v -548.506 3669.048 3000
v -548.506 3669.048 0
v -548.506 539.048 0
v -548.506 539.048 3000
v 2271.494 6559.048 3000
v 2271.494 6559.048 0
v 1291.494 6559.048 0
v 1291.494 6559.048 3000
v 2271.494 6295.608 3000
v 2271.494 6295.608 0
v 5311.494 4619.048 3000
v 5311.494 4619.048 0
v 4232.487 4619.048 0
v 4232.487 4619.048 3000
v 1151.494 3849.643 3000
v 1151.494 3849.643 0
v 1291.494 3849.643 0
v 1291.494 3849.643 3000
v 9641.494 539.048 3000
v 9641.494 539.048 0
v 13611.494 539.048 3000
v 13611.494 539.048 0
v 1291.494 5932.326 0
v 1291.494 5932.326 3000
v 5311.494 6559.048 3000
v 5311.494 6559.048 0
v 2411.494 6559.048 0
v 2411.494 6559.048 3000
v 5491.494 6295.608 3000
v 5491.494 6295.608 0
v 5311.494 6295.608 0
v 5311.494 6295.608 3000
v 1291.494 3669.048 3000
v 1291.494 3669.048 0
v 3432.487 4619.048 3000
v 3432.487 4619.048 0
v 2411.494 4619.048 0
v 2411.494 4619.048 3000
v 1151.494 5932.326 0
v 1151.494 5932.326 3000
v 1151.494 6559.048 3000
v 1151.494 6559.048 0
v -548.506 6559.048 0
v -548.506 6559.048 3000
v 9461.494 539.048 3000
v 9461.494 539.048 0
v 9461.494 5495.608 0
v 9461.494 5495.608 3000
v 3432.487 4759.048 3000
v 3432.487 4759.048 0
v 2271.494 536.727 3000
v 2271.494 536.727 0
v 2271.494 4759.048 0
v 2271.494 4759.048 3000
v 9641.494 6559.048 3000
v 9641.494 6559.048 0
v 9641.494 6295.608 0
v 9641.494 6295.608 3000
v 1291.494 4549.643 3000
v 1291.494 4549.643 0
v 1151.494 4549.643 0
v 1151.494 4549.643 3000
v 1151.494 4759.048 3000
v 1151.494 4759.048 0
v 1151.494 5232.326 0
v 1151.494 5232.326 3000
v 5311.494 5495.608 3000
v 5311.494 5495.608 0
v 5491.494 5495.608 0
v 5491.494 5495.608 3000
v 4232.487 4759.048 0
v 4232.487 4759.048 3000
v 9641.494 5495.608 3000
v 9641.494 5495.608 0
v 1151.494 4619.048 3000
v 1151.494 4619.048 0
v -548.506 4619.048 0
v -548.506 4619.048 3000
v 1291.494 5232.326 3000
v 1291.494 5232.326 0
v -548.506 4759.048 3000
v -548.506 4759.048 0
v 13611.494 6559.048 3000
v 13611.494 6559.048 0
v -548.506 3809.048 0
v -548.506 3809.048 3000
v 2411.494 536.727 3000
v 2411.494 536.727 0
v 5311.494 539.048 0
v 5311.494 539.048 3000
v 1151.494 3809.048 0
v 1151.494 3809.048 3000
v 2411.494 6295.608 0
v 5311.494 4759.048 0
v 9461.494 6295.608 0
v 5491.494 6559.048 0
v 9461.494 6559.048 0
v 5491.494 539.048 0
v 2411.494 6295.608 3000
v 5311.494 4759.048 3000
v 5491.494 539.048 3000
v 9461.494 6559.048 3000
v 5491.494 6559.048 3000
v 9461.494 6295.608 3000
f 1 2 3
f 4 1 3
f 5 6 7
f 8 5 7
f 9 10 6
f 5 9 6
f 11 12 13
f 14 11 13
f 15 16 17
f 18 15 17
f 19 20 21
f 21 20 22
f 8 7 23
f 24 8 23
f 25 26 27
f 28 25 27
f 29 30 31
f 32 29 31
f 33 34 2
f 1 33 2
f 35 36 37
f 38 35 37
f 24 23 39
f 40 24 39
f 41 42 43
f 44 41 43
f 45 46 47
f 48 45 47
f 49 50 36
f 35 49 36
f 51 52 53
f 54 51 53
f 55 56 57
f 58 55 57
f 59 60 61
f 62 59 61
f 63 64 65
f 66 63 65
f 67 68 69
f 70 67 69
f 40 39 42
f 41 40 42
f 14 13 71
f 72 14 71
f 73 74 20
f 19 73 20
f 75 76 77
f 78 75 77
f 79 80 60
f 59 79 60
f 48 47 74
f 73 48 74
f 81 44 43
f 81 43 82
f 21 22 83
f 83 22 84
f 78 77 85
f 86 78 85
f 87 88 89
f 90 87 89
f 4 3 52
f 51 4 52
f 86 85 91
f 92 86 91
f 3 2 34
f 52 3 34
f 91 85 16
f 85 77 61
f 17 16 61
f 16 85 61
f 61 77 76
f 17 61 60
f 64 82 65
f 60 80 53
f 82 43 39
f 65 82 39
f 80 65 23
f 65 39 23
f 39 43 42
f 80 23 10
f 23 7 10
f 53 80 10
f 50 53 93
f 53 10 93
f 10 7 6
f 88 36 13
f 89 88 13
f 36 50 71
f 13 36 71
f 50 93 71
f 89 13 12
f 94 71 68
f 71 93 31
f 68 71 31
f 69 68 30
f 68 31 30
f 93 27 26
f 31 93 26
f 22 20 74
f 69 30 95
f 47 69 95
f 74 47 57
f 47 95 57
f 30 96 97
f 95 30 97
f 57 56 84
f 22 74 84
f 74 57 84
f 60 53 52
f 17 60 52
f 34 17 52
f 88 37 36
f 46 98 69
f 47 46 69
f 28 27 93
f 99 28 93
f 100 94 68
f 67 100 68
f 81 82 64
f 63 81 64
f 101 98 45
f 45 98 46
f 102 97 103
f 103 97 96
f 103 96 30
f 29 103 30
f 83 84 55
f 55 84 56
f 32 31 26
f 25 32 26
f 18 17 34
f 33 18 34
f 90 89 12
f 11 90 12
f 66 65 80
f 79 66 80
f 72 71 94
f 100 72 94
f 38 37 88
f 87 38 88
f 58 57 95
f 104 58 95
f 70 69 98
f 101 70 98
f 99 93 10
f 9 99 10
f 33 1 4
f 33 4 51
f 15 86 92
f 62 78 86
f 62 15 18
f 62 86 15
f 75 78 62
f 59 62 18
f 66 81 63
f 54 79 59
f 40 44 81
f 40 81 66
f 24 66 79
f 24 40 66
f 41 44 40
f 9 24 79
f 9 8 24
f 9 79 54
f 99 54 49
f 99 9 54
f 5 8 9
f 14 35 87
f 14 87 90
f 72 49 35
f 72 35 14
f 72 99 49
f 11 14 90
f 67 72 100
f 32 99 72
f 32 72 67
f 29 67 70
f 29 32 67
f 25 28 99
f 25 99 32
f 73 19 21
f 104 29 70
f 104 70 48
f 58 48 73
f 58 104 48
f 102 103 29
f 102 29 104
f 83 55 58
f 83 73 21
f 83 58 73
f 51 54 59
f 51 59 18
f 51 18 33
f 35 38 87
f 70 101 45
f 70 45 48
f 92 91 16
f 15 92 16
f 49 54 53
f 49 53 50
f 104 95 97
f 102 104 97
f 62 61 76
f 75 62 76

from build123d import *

# Parameters (mm, degrees)
F1_DEPTH = 3000


with BuildPart() as f1:
    # F0 (on Top) → F1 (new body)
    with BuildSketch(Plane.XY):
        Polygon((-548.506346, 3669.047837), (-548.506346, 539.047837), (2271.493654, 536.726892), (2271.493654, 4759.047837), (3432.486654, 4759.047837), (3432.486654, 4619.047837), (2411.493654, 4619.047837), (2411.493654, 536.726892), (5311.493654, 539.047837), (5311.493654, 4619.047837), (4232.486654, 4619.047837), (4232.486654, 4759.047837), (5311.493654, 4759.047837), (5311.493654, 5495.607567), (5491.493654, 5495.607567), (5491.493654, 539.047837), (9461.493654, 539.047837), (9461.493654, 5495.607567), (9641.493654, 5495.607567), (9641.493654, 539.047837), (13611.493654, 539.047837), (13611.493654, 6559.047837), (9641.493654, 6559.047837), (9641.493654, 6295.607567), (9461.493654, 6295.607567), (9461.493654, 6559.047837), (5491.493654, 6559.047837), (5491.493654, 6295.607567), (5311.493654, 6295.607567), (5311.493654, 6559.047837), (2411.493654, 6559.047837), (2411.493654, 6295.607567), (2271.493654, 6295.607567), (2271.493654, 6559.047837), (1291.493654, 6559.047837), (1291.493654, 5932.326435), (1151.493654, 5932.326435), (1151.493654, 6559.047837), (-548.506346, 6559.047837), (-548.506346, 4759.047837), (1151.493654, 4759.047837), (1151.493654, 5232.326435), (1291.493654, 5232.326435), (1291.493654, 4619.047837), (1291.493654, 4549.64323), (1151.493654, 4549.64323), (1151.493654, 4619.047837), (-548.506346, 4619.047837), (-548.506346, 3809.047837), (1151.493654, 3809.047837), (1151.493654, 3849.64323), (1291.493654, 3849.64323), (1291.493654, 3669.047837), align=None)
    extrude(amount=F1_DEPTH)


solid = f1.part
